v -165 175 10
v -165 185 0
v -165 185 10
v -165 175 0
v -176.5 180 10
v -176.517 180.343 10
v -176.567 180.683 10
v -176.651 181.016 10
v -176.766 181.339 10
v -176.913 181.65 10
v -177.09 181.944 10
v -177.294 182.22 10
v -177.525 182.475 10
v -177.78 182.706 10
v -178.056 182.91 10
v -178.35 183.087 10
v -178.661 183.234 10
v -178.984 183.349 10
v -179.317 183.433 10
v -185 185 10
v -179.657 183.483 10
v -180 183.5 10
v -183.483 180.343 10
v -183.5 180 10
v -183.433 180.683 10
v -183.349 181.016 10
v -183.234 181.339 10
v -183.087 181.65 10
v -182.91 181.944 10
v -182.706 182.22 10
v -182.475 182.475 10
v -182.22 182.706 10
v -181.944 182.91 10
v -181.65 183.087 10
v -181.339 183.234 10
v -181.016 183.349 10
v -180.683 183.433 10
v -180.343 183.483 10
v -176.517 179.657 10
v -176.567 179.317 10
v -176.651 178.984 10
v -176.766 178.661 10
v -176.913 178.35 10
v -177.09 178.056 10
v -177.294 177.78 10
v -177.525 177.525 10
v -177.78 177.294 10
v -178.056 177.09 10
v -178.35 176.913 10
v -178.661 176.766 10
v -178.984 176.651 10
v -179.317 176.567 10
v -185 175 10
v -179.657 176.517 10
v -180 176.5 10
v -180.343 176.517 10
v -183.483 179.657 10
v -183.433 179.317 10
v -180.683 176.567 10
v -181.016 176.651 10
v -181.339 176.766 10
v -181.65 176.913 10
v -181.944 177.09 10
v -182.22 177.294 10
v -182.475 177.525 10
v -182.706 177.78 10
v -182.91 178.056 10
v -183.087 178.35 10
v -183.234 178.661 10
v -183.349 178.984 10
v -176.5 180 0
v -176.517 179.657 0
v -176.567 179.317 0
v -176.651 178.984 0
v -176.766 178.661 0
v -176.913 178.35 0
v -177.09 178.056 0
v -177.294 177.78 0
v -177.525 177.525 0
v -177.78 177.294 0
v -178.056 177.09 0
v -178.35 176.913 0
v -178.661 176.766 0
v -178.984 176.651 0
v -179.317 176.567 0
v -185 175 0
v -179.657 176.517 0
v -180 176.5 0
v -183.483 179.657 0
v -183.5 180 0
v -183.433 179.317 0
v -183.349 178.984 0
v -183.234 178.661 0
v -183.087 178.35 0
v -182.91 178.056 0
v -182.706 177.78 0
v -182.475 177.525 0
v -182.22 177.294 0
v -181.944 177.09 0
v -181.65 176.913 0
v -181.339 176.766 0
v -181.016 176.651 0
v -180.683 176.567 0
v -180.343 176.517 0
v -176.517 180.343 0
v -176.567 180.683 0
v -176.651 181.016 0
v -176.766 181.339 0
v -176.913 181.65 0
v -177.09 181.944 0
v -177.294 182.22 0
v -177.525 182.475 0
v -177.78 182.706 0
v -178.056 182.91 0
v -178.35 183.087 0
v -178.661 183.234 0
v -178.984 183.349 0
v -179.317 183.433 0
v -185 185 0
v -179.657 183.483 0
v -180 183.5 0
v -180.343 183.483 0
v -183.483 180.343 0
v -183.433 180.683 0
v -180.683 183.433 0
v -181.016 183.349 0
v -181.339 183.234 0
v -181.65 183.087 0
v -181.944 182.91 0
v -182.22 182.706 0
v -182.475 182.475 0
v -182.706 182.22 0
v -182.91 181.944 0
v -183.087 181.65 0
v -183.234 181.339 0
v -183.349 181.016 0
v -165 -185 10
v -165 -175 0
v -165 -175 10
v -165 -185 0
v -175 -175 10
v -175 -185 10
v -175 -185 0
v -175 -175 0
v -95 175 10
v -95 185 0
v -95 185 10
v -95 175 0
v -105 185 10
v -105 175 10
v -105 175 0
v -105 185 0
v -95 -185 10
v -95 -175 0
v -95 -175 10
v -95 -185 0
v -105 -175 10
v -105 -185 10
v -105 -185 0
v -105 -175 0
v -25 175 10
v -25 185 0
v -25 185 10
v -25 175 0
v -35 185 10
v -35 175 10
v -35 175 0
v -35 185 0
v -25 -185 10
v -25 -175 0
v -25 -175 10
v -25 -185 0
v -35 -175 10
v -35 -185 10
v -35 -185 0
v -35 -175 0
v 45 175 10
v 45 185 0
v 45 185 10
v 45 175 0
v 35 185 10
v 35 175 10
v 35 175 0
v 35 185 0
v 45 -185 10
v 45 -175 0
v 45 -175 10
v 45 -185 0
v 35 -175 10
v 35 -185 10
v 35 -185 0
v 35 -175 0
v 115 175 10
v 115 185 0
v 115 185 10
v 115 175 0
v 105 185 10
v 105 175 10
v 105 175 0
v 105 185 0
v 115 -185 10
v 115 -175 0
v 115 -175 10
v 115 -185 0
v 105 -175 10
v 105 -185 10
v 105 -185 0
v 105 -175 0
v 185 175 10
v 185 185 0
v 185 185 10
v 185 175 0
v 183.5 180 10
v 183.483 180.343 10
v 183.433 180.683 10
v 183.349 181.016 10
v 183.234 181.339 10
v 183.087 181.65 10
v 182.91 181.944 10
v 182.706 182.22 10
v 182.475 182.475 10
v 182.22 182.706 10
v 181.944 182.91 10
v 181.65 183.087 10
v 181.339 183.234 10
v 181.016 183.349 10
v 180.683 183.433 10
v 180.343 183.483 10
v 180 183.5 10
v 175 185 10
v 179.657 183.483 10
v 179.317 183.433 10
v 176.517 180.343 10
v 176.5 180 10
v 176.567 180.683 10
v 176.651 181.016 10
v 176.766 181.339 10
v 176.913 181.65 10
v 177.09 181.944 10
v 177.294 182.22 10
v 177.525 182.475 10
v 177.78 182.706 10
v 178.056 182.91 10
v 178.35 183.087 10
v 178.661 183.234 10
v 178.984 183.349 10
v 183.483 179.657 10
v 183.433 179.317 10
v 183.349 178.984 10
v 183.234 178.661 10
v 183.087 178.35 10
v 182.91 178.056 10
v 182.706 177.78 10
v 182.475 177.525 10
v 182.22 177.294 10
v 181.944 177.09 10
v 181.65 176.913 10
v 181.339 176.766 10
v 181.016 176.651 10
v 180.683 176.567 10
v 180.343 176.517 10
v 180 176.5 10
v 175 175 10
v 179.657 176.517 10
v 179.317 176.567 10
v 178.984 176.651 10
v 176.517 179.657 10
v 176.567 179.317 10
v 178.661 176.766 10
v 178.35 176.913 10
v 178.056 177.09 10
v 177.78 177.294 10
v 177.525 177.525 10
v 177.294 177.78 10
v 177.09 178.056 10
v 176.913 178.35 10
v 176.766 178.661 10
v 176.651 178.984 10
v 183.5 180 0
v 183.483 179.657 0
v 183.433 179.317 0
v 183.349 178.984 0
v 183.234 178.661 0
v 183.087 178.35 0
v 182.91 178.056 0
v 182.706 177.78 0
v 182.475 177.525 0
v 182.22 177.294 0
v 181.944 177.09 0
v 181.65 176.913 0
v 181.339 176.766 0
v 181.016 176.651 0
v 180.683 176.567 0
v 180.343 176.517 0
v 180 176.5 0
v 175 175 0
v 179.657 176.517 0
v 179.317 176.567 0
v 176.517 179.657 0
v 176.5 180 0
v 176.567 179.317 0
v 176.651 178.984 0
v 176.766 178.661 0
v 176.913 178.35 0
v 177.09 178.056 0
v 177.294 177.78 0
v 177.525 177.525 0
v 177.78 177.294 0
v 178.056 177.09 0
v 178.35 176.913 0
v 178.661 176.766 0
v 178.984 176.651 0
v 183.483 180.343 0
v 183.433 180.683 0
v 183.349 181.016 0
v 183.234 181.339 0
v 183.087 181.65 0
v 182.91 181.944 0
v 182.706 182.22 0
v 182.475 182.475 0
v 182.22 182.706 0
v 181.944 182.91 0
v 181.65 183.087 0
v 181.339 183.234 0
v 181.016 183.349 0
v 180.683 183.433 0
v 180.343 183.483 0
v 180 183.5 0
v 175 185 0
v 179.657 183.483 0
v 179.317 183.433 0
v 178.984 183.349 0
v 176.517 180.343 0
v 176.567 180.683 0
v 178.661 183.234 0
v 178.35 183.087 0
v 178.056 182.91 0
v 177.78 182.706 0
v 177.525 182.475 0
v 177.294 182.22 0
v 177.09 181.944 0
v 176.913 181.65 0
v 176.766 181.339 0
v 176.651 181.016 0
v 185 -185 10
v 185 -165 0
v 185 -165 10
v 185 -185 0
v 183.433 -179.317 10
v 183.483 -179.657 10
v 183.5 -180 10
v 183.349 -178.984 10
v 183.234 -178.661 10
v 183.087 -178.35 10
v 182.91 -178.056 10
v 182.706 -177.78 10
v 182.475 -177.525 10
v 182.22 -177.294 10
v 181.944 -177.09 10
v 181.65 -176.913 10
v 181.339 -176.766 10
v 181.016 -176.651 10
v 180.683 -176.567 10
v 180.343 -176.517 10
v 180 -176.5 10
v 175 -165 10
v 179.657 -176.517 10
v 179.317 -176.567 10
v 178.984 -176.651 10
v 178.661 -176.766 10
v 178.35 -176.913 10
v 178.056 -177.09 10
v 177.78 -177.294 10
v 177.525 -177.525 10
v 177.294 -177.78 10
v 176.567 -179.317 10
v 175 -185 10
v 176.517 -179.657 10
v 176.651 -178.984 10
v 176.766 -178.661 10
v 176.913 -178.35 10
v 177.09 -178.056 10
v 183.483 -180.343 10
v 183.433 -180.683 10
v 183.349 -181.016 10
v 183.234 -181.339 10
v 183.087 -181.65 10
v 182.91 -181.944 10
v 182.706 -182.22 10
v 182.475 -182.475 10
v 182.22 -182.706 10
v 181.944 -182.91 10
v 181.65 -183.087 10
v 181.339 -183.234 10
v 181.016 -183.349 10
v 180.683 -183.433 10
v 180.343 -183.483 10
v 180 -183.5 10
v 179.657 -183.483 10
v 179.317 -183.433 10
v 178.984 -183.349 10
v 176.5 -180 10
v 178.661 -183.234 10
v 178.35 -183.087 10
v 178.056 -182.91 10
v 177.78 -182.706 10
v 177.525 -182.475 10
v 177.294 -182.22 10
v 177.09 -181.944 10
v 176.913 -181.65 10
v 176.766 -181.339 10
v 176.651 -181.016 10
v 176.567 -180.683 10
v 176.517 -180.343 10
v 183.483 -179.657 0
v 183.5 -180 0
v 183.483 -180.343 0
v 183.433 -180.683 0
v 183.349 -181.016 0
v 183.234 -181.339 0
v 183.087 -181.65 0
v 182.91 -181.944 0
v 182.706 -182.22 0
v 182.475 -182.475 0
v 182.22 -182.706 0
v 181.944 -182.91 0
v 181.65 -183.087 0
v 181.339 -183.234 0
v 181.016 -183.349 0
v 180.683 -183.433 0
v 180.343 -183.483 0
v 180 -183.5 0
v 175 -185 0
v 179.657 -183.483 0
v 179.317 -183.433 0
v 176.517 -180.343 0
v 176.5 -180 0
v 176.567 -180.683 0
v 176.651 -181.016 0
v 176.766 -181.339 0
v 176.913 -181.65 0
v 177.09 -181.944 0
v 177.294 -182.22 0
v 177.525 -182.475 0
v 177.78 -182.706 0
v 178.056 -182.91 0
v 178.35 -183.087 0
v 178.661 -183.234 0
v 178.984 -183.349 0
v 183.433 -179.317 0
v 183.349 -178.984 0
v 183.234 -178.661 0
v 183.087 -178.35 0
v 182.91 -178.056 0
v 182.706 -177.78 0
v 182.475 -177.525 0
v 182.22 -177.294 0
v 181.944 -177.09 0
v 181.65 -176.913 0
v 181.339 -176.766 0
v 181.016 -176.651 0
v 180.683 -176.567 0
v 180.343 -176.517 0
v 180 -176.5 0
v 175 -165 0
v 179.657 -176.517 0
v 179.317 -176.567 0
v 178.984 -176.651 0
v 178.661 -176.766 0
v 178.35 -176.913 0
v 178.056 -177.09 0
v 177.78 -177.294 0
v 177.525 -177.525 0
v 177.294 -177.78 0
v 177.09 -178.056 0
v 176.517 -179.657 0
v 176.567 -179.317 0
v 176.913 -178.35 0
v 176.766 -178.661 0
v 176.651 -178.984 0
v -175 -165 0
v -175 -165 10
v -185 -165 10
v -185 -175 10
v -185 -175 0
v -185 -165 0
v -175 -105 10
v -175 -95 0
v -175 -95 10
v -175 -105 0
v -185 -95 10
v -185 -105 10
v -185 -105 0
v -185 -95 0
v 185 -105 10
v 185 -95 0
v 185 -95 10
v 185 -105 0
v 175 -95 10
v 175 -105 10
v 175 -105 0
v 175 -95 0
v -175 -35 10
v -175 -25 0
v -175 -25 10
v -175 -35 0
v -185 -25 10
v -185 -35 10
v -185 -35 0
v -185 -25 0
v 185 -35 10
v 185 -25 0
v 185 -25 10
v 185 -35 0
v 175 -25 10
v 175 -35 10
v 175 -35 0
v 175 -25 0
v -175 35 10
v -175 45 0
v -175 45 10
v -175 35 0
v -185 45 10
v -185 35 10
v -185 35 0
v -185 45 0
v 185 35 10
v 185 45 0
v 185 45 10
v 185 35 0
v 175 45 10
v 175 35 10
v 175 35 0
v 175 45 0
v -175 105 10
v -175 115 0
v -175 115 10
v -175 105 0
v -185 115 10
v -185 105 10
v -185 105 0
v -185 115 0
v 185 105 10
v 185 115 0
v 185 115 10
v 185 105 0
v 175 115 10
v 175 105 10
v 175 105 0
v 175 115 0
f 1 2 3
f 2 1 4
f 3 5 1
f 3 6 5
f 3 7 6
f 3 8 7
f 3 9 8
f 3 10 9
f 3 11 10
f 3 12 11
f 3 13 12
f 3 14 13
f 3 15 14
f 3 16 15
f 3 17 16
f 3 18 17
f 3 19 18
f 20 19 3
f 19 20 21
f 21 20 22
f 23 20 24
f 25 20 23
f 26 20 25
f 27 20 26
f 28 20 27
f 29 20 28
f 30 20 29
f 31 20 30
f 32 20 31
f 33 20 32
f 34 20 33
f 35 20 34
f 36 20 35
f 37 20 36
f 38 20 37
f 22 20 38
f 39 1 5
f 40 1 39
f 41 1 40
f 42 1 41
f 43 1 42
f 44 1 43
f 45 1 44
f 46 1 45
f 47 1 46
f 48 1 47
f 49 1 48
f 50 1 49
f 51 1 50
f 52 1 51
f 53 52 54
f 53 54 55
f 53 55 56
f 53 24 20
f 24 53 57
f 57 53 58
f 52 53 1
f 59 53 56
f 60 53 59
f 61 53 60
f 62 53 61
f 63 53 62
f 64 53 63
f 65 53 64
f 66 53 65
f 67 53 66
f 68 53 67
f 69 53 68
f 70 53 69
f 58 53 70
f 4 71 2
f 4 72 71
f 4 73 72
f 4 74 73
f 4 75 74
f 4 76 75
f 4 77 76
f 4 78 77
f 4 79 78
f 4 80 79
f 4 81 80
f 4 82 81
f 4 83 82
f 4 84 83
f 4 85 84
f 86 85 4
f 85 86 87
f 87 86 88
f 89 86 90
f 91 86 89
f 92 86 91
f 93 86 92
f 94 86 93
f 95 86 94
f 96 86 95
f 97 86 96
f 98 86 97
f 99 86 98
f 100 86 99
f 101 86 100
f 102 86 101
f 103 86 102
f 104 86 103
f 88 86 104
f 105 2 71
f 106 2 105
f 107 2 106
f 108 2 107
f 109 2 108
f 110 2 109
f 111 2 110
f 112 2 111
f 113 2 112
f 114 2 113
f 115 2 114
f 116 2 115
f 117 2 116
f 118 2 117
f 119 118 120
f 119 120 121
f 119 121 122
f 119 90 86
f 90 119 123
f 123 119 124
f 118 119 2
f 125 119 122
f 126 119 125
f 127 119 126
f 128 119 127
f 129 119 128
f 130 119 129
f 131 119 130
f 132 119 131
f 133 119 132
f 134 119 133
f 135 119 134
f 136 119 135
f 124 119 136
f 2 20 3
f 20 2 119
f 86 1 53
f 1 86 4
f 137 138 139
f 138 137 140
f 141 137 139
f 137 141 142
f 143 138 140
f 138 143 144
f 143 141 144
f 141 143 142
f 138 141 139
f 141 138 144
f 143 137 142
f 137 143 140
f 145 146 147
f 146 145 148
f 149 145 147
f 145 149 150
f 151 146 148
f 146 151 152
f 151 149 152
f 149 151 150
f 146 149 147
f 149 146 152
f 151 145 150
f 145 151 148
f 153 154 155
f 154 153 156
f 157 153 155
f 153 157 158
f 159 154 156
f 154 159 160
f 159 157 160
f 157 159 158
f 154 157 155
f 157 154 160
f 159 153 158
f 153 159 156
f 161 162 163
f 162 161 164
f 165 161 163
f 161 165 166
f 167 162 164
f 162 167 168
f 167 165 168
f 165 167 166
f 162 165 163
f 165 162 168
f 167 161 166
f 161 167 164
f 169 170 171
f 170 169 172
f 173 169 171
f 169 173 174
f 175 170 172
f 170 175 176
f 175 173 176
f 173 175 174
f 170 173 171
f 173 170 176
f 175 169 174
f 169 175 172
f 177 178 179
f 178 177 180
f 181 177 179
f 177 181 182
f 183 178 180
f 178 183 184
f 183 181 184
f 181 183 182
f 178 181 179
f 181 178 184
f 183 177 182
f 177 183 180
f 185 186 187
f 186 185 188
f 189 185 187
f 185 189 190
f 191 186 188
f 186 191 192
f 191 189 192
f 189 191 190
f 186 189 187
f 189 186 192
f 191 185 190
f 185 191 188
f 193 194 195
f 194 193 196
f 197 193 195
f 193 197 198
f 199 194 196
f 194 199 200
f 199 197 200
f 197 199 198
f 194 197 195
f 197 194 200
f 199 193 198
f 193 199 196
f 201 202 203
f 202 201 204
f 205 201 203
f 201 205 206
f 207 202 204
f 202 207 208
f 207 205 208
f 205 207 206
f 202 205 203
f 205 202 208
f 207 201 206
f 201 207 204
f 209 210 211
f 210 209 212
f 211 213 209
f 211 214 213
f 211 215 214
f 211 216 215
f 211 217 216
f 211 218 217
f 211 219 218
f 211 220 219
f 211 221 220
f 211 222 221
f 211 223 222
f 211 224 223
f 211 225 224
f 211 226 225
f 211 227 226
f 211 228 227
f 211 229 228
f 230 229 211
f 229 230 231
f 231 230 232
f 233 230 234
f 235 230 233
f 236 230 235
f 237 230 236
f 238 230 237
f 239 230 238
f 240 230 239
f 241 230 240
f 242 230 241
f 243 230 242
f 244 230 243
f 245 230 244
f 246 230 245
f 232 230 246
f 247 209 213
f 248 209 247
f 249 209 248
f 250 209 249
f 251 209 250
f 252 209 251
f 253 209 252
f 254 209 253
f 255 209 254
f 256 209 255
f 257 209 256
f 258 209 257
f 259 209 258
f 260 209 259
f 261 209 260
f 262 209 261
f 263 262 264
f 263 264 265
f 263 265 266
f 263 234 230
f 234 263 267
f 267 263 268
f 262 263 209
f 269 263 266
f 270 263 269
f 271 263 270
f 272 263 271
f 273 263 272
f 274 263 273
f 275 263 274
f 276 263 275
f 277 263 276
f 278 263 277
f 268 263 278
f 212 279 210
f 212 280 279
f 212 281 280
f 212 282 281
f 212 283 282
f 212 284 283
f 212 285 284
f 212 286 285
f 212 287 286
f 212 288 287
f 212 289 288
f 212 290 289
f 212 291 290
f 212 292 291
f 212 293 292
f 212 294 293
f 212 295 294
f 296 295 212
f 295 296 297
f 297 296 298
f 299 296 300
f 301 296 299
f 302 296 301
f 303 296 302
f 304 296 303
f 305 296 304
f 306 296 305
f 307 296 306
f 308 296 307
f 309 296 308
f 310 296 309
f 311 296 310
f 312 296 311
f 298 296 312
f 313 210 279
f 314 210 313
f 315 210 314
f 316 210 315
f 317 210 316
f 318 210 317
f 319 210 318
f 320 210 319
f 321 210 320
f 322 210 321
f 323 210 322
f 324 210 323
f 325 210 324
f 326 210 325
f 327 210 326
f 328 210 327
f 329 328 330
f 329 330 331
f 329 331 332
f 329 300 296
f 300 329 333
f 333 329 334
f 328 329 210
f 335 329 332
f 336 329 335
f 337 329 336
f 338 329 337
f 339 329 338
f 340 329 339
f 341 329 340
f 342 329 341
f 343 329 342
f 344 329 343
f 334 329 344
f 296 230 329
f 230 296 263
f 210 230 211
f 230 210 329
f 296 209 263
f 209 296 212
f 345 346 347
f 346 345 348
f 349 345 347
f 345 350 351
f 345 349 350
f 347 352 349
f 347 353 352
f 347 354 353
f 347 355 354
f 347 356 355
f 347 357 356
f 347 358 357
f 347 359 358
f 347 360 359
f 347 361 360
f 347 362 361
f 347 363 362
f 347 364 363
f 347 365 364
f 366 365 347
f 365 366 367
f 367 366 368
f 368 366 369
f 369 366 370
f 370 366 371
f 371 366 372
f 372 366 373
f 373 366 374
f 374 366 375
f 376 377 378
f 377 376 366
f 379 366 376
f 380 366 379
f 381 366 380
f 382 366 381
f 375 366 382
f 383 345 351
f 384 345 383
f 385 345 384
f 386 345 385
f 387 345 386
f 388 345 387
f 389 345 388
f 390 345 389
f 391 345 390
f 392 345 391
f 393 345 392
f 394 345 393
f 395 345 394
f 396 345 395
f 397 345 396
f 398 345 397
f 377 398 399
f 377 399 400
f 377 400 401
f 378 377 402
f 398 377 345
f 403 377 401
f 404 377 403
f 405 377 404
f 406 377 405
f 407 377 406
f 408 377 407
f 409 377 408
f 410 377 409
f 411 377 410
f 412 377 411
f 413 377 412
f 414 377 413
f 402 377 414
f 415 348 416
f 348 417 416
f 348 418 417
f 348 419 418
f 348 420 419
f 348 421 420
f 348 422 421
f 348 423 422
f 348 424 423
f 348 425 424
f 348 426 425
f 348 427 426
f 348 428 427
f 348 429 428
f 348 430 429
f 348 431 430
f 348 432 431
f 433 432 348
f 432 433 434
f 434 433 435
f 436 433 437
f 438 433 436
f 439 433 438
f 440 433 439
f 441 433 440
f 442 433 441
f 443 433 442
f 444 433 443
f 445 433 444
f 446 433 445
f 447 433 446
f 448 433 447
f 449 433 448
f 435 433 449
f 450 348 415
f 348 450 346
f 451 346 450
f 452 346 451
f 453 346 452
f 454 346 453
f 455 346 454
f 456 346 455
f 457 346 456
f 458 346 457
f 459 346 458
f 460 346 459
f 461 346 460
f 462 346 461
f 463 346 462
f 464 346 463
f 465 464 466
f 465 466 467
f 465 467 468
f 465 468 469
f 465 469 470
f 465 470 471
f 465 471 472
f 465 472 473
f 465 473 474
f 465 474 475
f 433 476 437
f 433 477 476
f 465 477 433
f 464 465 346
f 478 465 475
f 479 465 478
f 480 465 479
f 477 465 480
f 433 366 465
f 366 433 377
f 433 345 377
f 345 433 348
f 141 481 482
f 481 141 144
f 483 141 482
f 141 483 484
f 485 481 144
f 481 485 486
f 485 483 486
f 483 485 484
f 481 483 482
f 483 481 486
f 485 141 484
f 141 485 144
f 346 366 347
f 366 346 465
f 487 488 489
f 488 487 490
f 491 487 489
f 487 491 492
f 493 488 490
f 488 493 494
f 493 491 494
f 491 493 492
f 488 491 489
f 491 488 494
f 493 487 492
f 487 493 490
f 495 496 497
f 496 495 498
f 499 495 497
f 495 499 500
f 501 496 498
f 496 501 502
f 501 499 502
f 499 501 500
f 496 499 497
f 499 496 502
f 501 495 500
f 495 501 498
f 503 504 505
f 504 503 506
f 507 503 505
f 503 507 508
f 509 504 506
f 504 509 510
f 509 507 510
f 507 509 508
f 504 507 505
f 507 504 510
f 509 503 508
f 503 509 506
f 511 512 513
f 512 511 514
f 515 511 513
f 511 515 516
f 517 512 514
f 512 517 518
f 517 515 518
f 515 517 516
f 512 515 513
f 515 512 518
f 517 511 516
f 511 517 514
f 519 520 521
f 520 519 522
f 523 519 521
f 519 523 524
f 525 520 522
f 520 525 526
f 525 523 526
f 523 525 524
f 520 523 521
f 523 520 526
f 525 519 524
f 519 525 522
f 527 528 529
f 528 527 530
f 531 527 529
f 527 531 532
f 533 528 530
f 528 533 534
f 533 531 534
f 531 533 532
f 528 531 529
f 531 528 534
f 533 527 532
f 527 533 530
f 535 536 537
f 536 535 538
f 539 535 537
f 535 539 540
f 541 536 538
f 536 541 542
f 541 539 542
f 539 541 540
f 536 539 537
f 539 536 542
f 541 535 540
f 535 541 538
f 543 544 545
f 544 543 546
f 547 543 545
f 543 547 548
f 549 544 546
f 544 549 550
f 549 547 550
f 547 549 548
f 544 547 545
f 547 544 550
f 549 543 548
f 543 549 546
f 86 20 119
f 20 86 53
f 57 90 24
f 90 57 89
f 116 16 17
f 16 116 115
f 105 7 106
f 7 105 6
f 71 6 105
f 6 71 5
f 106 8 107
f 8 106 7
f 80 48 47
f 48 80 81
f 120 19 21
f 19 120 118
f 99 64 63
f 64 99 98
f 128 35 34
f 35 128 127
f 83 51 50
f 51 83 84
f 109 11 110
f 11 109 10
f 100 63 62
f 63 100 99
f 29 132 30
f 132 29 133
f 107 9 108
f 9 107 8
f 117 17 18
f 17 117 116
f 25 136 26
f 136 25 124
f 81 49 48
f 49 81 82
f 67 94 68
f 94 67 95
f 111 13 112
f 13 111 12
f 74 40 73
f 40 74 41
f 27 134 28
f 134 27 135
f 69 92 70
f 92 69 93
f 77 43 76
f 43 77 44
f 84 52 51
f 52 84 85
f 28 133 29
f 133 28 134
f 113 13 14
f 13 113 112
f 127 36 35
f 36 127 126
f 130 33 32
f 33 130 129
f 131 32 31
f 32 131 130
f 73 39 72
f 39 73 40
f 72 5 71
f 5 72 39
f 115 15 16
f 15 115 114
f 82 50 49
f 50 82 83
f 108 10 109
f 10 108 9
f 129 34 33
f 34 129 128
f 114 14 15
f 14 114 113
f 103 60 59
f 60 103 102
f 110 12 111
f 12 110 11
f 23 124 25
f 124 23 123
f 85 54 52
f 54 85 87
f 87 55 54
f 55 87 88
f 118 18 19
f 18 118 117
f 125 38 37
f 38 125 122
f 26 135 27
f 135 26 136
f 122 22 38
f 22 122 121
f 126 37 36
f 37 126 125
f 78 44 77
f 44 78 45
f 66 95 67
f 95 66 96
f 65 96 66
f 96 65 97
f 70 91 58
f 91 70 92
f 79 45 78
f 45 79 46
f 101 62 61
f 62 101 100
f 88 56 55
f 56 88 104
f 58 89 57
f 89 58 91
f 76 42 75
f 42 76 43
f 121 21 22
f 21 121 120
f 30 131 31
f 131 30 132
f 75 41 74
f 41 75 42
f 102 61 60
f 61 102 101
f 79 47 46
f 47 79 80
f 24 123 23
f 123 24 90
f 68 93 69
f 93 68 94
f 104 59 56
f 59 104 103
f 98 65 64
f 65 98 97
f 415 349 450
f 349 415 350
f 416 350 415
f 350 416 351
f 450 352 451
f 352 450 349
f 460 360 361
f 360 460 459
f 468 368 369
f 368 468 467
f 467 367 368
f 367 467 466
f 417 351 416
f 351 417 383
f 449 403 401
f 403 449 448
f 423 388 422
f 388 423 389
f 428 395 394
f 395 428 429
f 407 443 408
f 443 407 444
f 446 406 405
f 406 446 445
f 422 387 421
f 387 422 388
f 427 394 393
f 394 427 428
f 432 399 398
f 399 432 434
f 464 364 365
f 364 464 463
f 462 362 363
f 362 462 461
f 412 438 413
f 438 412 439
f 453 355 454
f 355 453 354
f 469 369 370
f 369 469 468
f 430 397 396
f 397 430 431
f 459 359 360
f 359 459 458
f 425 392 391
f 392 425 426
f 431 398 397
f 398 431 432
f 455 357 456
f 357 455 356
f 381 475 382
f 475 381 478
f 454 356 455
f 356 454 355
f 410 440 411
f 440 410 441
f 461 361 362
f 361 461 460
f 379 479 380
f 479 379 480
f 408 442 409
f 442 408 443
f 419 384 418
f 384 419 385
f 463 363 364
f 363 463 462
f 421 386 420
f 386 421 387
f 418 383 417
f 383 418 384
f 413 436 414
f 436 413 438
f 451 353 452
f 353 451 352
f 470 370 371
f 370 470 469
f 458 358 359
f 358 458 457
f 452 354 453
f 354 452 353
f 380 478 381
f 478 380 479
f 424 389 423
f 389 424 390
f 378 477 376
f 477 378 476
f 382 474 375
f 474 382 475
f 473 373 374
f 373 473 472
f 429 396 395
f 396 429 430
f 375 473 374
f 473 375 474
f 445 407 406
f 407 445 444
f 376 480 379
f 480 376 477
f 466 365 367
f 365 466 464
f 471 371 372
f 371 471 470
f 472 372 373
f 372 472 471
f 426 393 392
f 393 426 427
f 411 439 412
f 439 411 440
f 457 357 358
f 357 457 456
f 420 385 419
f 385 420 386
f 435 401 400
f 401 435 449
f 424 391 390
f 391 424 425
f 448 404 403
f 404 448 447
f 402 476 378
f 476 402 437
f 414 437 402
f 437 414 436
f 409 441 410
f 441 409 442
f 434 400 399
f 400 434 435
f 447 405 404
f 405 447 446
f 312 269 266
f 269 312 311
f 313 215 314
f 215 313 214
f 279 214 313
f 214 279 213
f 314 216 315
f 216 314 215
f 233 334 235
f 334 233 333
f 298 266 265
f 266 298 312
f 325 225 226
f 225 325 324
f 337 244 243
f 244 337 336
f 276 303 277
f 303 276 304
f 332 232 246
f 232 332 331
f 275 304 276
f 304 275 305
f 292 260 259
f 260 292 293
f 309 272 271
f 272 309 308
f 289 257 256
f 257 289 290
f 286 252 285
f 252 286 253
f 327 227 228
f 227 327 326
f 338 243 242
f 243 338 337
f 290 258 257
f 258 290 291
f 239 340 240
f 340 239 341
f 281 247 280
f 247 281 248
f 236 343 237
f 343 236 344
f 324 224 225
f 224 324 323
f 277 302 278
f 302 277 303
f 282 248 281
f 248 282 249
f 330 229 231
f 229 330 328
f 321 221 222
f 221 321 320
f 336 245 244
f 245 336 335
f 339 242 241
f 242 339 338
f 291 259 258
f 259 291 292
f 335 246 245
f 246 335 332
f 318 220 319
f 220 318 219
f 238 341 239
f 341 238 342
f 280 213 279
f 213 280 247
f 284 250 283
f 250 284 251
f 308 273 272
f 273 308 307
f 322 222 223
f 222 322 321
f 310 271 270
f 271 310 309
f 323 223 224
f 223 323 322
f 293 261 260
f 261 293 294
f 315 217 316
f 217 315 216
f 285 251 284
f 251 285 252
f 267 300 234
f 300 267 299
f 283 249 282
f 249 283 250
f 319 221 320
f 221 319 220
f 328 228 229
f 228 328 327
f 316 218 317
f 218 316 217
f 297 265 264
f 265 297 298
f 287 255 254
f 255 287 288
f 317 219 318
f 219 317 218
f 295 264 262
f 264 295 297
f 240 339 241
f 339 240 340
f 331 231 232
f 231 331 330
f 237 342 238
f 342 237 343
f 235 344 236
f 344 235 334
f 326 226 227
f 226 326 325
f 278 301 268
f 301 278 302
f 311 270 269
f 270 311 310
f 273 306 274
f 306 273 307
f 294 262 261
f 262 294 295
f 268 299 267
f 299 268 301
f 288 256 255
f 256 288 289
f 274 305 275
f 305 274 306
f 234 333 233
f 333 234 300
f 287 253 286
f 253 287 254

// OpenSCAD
// ring_48.scad - ring index 48 (z bottom = 480 mm)
$fn = 64; bar = 10; half_b = bar/2; outer = 370; half_outer = outer/2;
front_y = 180; back_y = -180; left_x = -180; right_x = 180;
x_centers = [-170, -100, -30, 40, 110, 180];
z_centers = [5, 85, 155, 225, 295, 365, 435, 505, 575, 645, 715]; ring_z = 480;
module place_box(cx, cy, sx, sy) { translate([cx - sx/2, cy - sy/2, 0]) cube([sx, sy, bar]); }

difference() { union() {
    for (x = x_centers) { place_box(x, front_y, bar, bar); place_box(x, back_y, bar, bar); }
    for (y = x_centers) { place_box(left_x, y, bar, bar); place_box(right_x, y, bar, bar); }
    for (zc = z_centers) if ((zc - half_b < ring_z + bar) && (zc + half_b > ring_z)) {
        translate([-half_outer, front_y - half_b, 0]) cube([outer, bar, bar]);
        translate([-half_outer, back_y - half_b, 0])  cube([outer, bar, bar]);
        translate([left_x - half_b, -half_outer, 0])  cube([bar, outer, bar]);
        translate([right_x - half_b, -half_outer, 0]) cube([bar, outer, bar]);
    }
  }
  for (cx = [-180, 180]) for (cy = [-180, 180]) translate([cx, cy, 0]) cylinder(h = bar, r = 3.5, $fn = 64);
}
